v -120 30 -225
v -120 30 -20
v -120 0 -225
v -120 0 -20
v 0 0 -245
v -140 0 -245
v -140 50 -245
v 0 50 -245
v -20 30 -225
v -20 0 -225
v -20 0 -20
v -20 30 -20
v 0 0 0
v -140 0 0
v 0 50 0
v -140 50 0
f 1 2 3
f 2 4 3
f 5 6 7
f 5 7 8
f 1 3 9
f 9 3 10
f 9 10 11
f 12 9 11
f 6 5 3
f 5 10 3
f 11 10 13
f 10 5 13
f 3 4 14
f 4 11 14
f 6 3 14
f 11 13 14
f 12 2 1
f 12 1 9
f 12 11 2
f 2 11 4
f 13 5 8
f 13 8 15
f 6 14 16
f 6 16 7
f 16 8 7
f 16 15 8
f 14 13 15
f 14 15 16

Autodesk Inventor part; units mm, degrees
ref_plane "YZ Plane" through (0, 0, 0) normal (1, 0, 0) x (0, 1, 0)
ref_plane "XZ Plane" through (0, 0, 0) normal (0, 1, 0) x (-1, 0, 0)
ref_plane "XY Plane" through (0, 0, 0) normal (0, 0, 1) x (1, 0, 0)
sketch "Boceto1" plane through (0, 0, 0) normal (0, 1, 0) x (-1, 0, 0)
  line L0 (0, 0) -> (140, 0)
  line L1 (140, 0) -> (140, -245)
  line L2 (140, -245) -> (0, -245)
  line L3 (0, -245) -> (0, 0)
  dimension "d0" = 140
  dimension "d1" = 245
extrude "Extrusión1" add sketch "Boceto1" along normal blind 50
sketch "Boceto2" plane through (0, 0, 0) normal (0, -1, 0) x (1, 0, 0)
  line L0 (0, -245) -> (-140, -245) projected
  line L1 (0, 0) -> (0, -245) projected
  line L2 (-140, 0) -> (0, 0) projected
  line L3 (-140, -245) -> (-140, 0) projected
  line L4 (29.1712, 0) -> (29.1712, -20)
  line L5 (0, 50.4533) -> (-20, 50.4533)
  line L6 (-175.5774, 0) -> (-175.5774, -20)
  line L7 (-175.5774, -245) -> (-175.5774, -225)
  line L8 (29.1712, -245) -> (29.1712, -225)
  line L9 (0, -265) -> (-20, -265)
  line L10 (-140, 34.3082) -> (-120, 34.3082)
  line L11 (-140, -269.5122) -> (-120, -269.5122)
  line L12 (-20, -20) -> (-120, -20)
  line L13 (-120, -20) -> (-120, -225)
  line L14 (-120, -225) -> (-20, -225)
  line L15 (-20, -225) -> (-20, -20)
  dimension "d4" = 20
  dimension "d5" = 20
  dimension "d7" = 20
  dimension "d9" = 20
  dimension "d10" = 20
  dimension "d11" = 20
  dimension "d12" = 20
  dimension "d13" = 20
extrude "Extrusión2" cut sketch "Boceto2" against normal blind 30 contours L15 L14 L13 L12
properties part number "Lamina Superior"
